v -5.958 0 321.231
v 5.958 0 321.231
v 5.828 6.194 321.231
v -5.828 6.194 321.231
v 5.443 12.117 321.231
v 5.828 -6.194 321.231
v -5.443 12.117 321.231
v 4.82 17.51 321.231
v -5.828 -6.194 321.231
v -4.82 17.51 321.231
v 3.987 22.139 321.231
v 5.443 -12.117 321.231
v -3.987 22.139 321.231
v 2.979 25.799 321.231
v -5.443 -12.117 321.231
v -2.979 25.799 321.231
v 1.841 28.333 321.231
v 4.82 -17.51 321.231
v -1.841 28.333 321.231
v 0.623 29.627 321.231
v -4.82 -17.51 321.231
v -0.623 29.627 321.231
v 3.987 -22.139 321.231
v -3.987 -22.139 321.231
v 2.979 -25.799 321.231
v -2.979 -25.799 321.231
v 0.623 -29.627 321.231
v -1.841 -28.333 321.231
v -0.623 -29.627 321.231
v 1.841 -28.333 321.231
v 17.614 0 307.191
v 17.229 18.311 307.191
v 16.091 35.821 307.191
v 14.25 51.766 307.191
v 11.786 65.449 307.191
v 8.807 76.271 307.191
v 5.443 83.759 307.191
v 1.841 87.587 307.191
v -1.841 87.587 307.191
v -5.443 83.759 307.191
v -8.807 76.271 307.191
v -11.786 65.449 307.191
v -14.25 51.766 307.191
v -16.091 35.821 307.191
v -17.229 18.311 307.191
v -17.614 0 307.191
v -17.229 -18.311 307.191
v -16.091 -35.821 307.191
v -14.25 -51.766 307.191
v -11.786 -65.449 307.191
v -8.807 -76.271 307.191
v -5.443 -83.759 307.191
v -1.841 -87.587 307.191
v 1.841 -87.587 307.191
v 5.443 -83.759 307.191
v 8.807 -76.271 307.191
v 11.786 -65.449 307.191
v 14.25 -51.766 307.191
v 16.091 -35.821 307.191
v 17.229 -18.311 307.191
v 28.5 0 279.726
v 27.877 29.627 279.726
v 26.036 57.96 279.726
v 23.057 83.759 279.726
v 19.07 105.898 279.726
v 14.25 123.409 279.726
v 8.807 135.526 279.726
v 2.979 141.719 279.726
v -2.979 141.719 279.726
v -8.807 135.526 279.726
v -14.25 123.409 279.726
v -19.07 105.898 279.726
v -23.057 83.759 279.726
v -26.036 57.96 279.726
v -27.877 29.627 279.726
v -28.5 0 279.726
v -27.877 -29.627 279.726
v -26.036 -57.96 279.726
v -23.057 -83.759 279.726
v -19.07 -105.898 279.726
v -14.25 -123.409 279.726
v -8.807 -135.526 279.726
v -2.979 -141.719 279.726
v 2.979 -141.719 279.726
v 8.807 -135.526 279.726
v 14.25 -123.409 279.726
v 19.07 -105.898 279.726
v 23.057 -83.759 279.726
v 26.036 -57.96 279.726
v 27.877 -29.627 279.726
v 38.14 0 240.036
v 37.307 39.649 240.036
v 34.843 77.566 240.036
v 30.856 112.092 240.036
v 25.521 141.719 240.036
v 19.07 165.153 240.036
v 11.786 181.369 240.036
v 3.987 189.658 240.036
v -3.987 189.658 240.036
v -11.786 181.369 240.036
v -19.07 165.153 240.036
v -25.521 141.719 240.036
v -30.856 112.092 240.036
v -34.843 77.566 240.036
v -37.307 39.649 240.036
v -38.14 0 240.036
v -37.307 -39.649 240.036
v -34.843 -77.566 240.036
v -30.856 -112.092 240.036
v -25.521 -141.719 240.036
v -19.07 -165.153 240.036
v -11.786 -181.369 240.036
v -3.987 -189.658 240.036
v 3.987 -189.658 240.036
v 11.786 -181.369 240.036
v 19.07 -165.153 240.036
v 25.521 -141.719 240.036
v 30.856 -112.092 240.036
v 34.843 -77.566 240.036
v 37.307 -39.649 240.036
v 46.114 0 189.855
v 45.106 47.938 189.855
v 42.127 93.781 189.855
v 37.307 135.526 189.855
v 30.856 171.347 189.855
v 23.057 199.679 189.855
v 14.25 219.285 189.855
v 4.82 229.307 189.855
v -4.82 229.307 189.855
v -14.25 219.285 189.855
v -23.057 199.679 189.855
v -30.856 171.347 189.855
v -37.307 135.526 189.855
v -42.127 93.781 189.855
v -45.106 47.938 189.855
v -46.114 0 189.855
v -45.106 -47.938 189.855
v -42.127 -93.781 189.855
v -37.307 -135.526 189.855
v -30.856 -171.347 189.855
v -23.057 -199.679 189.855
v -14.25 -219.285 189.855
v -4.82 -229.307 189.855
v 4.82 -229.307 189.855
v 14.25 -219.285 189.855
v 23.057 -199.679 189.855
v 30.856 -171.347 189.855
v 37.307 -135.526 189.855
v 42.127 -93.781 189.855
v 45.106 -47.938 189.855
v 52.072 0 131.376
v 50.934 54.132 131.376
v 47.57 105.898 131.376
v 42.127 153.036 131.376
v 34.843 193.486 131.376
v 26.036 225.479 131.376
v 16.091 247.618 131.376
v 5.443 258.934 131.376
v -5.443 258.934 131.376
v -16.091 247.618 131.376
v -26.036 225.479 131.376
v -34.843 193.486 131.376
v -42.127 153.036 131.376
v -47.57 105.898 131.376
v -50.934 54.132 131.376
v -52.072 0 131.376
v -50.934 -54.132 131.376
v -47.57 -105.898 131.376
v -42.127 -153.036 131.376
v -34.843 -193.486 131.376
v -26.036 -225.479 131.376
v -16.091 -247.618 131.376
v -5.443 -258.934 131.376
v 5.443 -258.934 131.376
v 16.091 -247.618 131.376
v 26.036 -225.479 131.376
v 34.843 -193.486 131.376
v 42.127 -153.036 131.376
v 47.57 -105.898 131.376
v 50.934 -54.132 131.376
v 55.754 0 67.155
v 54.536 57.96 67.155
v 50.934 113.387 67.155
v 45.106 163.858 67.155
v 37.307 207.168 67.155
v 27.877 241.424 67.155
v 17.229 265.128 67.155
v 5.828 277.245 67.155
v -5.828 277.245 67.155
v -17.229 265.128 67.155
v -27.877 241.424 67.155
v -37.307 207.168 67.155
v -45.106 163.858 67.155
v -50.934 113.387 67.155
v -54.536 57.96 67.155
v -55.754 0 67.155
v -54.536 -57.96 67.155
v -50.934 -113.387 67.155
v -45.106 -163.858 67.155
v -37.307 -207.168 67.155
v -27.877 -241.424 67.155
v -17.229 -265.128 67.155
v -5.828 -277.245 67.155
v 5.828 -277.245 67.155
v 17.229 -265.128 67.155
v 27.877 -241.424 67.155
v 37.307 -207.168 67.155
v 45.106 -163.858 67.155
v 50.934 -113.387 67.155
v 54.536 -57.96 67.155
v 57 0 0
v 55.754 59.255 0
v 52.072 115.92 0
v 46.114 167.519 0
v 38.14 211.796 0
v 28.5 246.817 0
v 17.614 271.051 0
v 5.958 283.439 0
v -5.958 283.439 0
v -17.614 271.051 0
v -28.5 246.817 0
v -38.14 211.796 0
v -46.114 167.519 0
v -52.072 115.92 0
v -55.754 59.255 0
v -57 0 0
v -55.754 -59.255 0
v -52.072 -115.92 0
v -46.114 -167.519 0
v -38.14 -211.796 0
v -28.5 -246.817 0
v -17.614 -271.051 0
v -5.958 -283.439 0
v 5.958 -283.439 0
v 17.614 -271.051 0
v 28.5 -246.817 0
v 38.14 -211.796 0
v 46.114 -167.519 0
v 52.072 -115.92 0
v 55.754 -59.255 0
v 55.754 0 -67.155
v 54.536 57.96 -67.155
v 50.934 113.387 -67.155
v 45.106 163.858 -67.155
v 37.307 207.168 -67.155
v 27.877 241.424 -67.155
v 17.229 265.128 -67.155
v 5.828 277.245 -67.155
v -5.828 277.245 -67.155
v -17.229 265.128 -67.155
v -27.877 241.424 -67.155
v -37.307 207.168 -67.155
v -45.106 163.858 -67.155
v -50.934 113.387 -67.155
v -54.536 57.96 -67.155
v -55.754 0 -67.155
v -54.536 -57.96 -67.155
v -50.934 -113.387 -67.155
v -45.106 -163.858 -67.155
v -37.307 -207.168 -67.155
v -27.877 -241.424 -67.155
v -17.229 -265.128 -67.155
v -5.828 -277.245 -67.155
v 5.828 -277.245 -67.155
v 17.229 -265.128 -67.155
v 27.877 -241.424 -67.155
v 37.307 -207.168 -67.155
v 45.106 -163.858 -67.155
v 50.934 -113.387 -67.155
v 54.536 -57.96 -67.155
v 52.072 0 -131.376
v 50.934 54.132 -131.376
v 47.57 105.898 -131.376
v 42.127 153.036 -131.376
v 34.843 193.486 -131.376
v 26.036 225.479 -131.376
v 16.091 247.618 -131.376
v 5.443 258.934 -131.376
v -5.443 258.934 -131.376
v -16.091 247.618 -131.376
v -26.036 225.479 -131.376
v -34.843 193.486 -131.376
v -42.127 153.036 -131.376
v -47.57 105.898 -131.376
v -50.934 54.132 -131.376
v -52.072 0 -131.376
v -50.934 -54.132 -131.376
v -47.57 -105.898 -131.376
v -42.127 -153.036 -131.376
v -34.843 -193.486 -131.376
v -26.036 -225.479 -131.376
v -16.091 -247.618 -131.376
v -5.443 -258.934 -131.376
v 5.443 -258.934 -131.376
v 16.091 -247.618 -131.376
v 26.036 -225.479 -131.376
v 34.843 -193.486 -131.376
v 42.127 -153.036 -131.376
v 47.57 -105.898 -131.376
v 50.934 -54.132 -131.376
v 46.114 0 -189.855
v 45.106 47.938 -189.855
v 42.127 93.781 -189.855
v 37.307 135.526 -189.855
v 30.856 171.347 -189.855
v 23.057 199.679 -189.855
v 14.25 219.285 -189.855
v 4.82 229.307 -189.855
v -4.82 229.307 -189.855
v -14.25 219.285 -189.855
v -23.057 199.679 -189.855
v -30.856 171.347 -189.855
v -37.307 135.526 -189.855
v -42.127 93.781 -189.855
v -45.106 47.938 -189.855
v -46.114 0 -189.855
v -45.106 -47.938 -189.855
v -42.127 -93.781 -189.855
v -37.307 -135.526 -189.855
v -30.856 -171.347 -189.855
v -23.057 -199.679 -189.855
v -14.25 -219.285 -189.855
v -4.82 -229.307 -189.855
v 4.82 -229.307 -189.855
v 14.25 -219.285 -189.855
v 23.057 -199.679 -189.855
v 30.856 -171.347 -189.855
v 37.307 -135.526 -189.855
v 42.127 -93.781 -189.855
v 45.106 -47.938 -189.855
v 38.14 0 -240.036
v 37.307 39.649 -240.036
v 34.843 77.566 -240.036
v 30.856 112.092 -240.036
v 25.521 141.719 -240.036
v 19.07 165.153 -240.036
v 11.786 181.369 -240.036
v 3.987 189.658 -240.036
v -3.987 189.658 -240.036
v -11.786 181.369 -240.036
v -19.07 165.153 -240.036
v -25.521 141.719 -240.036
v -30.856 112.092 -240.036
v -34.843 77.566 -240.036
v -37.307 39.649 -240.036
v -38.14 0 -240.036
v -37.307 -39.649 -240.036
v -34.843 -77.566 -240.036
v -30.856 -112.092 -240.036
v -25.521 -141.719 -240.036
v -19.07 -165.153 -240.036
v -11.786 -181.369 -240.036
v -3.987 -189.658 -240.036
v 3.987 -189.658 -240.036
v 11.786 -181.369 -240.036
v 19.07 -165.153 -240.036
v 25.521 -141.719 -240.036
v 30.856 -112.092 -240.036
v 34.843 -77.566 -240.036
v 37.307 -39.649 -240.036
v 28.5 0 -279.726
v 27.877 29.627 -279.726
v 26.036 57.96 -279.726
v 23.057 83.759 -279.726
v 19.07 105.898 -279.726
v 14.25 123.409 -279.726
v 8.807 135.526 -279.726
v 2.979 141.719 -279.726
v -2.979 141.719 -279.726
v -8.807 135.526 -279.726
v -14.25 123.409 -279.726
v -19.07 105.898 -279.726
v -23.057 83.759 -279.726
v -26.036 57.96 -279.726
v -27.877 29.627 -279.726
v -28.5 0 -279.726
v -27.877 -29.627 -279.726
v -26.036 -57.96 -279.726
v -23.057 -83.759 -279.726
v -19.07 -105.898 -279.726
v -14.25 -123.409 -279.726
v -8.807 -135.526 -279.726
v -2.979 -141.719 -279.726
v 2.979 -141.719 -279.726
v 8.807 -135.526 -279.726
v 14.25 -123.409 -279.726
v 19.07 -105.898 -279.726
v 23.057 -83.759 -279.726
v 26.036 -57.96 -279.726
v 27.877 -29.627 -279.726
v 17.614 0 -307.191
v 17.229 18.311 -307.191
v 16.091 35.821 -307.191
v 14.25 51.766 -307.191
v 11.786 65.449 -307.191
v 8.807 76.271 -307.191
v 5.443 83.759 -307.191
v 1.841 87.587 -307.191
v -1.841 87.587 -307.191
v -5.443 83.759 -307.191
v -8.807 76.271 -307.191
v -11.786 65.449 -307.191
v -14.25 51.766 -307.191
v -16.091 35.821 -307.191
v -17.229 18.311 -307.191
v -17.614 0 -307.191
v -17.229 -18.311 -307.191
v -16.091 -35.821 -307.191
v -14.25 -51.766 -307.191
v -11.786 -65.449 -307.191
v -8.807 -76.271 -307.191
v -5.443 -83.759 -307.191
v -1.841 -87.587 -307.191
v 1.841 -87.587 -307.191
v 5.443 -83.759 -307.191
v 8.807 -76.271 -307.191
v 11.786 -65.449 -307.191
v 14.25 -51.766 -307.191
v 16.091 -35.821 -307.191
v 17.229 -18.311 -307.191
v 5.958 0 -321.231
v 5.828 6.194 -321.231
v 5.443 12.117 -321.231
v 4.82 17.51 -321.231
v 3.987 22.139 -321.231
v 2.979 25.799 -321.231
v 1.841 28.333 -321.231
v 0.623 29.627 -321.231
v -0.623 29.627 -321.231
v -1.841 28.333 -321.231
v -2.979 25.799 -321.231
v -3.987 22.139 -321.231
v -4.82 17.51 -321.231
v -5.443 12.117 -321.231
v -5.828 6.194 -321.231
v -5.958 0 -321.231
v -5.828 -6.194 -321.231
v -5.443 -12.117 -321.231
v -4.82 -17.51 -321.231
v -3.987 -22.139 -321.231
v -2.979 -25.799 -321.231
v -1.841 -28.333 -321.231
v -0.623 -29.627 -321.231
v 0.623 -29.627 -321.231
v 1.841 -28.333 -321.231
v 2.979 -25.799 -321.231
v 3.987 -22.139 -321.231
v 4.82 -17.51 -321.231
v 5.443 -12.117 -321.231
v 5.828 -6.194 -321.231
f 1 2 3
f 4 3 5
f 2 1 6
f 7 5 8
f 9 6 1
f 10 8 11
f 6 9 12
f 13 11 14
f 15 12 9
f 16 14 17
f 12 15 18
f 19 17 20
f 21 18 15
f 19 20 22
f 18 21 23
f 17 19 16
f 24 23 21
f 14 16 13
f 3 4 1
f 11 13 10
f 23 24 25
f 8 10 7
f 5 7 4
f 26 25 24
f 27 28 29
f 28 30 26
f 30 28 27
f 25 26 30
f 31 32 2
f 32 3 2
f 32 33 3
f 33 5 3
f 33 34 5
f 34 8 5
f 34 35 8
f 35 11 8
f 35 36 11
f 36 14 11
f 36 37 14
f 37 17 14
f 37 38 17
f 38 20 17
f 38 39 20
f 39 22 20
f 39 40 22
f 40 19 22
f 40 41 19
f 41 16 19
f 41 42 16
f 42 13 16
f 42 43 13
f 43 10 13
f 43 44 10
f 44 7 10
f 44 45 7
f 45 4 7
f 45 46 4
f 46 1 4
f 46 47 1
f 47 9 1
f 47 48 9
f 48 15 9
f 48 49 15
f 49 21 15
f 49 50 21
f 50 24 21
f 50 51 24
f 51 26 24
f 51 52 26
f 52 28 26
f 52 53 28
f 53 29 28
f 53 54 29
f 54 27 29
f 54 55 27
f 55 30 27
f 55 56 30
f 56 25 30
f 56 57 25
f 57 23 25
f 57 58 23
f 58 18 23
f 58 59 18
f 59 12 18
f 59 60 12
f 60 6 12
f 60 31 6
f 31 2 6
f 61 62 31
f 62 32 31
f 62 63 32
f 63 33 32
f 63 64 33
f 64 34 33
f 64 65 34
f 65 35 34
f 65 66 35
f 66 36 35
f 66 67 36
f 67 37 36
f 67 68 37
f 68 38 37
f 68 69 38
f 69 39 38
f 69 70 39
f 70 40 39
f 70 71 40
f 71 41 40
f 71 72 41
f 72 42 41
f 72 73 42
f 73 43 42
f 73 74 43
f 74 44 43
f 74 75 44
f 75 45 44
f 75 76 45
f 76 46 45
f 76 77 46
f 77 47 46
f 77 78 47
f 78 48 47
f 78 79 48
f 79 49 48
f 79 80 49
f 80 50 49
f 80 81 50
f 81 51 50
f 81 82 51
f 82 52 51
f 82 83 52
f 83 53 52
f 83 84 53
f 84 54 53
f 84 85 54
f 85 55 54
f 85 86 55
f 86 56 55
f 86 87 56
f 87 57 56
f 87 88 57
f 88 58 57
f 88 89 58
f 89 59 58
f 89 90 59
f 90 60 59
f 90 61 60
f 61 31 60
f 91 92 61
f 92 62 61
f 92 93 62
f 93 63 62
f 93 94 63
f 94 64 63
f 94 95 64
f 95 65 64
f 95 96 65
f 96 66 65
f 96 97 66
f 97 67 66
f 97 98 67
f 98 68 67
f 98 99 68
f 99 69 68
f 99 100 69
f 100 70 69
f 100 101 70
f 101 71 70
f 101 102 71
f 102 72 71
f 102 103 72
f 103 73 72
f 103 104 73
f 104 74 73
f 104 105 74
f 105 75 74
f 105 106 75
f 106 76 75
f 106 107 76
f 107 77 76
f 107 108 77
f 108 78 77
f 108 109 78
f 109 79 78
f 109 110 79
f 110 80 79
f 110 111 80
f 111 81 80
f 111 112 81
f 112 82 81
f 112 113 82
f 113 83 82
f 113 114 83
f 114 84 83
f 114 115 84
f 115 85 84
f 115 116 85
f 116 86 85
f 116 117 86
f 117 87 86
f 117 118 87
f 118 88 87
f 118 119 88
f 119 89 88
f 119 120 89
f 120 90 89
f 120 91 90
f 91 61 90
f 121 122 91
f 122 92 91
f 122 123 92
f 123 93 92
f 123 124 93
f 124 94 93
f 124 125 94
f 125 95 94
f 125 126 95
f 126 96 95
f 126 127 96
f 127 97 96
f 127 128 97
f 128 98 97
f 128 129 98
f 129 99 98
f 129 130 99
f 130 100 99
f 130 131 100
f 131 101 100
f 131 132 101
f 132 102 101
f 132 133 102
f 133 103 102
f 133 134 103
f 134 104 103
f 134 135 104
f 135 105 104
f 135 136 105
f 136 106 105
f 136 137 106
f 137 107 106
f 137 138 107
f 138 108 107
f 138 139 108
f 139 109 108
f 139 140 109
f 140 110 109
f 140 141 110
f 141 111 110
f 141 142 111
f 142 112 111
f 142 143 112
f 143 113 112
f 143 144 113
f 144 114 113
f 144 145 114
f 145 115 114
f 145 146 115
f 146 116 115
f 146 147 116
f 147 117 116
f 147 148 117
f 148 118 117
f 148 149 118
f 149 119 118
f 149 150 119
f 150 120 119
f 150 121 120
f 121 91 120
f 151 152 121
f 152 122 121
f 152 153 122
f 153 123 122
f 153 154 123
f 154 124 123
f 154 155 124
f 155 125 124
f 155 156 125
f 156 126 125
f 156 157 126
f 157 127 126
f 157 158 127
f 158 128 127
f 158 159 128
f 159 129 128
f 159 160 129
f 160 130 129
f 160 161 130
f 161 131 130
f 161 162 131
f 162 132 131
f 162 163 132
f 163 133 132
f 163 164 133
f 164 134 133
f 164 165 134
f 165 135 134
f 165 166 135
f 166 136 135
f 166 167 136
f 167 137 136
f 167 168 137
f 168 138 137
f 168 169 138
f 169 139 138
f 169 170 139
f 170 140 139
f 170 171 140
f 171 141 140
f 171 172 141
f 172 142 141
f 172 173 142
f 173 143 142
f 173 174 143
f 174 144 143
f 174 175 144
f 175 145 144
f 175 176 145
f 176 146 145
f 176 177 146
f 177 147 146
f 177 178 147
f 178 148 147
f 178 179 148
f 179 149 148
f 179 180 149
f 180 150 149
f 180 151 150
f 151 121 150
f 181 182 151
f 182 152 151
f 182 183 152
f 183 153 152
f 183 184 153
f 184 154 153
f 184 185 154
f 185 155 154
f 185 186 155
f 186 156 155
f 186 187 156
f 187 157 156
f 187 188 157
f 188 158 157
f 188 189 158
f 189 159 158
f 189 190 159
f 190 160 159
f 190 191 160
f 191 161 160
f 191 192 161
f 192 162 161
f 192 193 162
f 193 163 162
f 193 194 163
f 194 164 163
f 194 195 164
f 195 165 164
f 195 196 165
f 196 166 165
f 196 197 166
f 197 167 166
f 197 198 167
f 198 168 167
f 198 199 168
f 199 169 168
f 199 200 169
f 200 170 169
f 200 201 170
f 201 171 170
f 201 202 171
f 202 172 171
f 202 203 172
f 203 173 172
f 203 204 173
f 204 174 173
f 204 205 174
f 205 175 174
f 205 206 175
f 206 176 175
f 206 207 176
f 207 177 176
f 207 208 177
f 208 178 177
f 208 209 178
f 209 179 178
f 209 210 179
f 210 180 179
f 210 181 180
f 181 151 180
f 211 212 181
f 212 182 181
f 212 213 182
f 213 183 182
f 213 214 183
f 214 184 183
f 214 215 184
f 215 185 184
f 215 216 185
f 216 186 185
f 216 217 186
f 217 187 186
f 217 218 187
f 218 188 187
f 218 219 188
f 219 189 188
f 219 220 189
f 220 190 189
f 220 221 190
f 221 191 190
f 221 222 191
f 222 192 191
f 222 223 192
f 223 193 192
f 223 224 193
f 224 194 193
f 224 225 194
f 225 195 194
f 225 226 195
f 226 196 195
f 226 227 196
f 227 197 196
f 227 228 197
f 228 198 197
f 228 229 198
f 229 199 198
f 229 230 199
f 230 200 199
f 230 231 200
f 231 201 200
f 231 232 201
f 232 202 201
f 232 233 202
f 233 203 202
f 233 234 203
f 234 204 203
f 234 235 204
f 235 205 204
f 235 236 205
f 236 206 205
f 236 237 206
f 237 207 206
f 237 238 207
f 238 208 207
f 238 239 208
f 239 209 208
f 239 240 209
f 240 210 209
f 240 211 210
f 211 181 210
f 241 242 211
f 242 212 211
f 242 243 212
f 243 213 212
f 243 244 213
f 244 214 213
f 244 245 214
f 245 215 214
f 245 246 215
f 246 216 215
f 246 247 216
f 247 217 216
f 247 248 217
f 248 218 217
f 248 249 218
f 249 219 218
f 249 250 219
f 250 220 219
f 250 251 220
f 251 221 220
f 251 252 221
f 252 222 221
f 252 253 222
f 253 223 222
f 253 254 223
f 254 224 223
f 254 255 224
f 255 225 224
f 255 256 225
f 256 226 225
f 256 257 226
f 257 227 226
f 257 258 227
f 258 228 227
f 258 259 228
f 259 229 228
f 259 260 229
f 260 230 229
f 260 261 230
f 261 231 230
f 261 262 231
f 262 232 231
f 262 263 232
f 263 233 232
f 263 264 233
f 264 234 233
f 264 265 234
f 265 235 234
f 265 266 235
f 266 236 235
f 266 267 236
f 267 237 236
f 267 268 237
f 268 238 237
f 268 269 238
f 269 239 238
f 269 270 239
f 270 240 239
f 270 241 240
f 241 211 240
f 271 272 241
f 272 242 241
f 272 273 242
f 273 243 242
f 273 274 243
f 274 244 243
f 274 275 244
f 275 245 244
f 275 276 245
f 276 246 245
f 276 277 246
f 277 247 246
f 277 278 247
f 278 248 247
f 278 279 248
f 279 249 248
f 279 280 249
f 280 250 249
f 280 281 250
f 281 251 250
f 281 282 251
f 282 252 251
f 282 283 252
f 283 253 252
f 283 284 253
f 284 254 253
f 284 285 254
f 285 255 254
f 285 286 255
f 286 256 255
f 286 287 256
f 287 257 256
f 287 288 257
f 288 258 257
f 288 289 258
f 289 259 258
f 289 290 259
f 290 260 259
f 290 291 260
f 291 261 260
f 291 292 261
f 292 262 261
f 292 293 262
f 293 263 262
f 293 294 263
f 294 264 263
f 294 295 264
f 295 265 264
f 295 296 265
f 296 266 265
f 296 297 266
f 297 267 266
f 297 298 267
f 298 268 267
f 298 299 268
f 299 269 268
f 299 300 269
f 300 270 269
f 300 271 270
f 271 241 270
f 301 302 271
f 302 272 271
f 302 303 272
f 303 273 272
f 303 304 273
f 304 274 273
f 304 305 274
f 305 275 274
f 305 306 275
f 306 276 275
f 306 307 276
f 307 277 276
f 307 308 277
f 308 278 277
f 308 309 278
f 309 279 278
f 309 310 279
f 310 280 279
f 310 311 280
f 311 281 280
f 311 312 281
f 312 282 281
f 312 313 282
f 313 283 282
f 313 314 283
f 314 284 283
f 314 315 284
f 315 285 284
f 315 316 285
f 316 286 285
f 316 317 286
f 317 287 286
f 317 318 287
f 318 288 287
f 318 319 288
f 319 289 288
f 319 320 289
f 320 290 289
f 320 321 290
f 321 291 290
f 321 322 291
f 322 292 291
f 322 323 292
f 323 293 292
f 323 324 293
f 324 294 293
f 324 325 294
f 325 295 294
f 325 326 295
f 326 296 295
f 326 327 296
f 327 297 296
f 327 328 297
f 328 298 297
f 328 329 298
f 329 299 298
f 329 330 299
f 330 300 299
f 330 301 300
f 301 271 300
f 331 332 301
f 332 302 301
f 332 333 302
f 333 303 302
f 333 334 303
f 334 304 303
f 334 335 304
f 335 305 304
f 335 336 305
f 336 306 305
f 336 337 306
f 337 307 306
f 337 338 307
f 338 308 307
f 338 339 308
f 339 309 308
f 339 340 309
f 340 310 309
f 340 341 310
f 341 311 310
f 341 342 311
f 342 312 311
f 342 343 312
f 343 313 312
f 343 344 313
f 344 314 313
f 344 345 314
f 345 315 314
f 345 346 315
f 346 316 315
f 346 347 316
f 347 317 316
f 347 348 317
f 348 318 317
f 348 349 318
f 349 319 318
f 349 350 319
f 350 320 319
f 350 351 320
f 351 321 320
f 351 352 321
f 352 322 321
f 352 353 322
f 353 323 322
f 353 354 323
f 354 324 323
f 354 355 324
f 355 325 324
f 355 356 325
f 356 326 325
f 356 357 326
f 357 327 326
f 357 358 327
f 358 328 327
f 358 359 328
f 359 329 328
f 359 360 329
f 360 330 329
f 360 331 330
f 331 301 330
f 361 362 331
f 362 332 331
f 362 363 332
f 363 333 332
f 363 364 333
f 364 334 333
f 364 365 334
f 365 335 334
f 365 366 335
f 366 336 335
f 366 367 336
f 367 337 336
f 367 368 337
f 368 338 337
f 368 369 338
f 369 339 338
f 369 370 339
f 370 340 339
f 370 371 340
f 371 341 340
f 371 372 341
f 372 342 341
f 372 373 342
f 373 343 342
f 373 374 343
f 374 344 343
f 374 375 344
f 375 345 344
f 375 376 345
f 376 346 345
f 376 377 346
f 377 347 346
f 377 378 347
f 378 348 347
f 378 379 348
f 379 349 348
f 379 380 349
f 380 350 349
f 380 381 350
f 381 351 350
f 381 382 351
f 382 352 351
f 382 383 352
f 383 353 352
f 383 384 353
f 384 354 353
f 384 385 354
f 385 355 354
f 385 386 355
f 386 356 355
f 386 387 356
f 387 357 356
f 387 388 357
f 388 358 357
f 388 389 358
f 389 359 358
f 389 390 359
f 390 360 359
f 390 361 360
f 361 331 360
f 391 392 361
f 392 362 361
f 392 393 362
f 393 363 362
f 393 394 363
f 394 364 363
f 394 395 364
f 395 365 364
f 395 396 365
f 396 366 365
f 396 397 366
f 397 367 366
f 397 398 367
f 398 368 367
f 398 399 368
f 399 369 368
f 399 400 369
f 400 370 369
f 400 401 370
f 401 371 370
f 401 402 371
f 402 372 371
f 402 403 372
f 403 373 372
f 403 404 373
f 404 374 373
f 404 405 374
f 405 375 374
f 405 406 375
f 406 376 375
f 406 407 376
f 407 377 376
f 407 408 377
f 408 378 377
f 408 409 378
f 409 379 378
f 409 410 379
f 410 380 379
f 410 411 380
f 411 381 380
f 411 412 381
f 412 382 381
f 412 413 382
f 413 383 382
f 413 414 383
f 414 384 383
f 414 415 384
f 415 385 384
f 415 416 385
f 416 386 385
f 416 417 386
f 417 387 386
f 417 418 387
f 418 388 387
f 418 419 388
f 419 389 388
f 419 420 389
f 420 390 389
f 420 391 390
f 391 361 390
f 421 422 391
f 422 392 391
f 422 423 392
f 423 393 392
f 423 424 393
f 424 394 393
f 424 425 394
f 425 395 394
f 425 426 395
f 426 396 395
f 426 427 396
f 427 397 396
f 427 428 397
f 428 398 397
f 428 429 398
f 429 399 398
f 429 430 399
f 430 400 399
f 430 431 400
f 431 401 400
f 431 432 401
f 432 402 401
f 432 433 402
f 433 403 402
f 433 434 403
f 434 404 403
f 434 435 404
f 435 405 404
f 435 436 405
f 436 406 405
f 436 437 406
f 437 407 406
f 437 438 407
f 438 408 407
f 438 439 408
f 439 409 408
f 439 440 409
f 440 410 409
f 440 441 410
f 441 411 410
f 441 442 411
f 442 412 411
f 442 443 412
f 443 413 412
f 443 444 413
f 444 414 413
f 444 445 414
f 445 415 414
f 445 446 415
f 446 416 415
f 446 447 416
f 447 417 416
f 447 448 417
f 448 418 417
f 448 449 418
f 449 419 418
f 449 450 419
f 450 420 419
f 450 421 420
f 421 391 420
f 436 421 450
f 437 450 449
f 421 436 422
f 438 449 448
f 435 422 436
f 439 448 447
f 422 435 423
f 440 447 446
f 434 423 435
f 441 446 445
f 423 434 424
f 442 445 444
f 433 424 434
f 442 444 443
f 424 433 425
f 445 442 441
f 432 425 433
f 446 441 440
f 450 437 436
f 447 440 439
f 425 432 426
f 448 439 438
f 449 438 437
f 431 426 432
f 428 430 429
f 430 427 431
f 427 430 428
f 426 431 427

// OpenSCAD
// Generated by SolidPython 1.0.1 on 2020-07-29 00:46:45


scale(v = [3, 15, 17]) {
	sphere(r = 19);
}
/***********************************************
*********      SolidPython code:      **********
************************************************
 
# import packages: SolidPython
from solid import *
from solid.utils import *
from itertools import chain, combinations, permutations


class Resize:

    def __init__(self, scad_file):
        self.scad_file = scad_file
        #self.scad_file = import_scad(scad_file)
        # cone/cylinder param:
        self.r1 = 0
        self.r2 = 0
        self.h = 0
        # rectangular prism param:
        self.w = 0
        self.l = 0
        # ellipse param:
        self.r = 0

    # import OpenScad code (file name corresponds to shape)


    # classify shape + parameters
    def assign(self, param1, param2, param3):
        if self.scad_file == 'cone.scad':
            self.r1 = param1
            self.r2 = param2
            self.h = param3
        elif self.scad_file == 'cylinder.scad':
            self.r1 = param1
            self.r2 = param2
            self.h = param3
        elif self.scad_file == 'rectangularPrism.scad':
            self.h = param1
            self.l = param2
            self.w = param3
        else:
            self.r = param1
            self.h = param2

    # resize parameters
    def iterate(self):
        x = range(3, 20, 2)
        i = 1
        if self.scad_file == 'cone.scad':
            tempList = list(permutations(x, 2))
            for temp in tempList:
                param1 = temp[0]
                param2 = temp[1]
                filepath = 'produced_scad_files/' + 'cone' + str(param1) + '_' + str(param2) + '_' + '.scad'
                scad_render_to_file(cylinder(h=param1, r1=param2, r2=0), filepath)

        elif self.scad_file == 'cylinder.scad':
            tempList = list(permutations(x, 3))
            for temp in tempList:
                param1 = temp[0]
                param2 = temp[1]
                filepath = 'produced_scad_files/' + 'cylinder' + str(param1) + '_' + str(param2) + '_' + '.scad'
                scad_render_to_file(cylinder(h=param1, r1=param2, r2=param2), filepath)

        elif self.scad_file == 'rectangularPrism.scad':
            tempList = list(permutations(x, 3))
            for temp in tempList:
                param1 = temp[0]
                param2 = temp[1]
                param3 = temp[2]
                filepath = 'produced_scad_files/' + 'rectangularPrism' + str(param1) + '_' + str(param2) + '_' + str(
                    param3) + '.scad'
                scad_render_to_file(cube(size=(param1, param2, param3)), filepath)

        elif self.scad_file == 'ellipse.scad':
            tempList = list(permutations(x, 4))
            for temp in tempList:
                param1 = temp[0]
                param2 = temp[1]
                param3 = temp[2]
                param4 = temp[3]
                filepath = 'produced_scad_files/' + 'ellipse' + str(param1) + '_' + str(param2) + '_' + str(param3) + '_' + str(param4) + '.scad'
                scad_render_to_file(scale([param1, param2, param3])(sphere(r=param4)), filepath)

    def render_to_scadfile(self):
        scad_render_to_file(scad, 'example.scad') 
 
************************************************/
